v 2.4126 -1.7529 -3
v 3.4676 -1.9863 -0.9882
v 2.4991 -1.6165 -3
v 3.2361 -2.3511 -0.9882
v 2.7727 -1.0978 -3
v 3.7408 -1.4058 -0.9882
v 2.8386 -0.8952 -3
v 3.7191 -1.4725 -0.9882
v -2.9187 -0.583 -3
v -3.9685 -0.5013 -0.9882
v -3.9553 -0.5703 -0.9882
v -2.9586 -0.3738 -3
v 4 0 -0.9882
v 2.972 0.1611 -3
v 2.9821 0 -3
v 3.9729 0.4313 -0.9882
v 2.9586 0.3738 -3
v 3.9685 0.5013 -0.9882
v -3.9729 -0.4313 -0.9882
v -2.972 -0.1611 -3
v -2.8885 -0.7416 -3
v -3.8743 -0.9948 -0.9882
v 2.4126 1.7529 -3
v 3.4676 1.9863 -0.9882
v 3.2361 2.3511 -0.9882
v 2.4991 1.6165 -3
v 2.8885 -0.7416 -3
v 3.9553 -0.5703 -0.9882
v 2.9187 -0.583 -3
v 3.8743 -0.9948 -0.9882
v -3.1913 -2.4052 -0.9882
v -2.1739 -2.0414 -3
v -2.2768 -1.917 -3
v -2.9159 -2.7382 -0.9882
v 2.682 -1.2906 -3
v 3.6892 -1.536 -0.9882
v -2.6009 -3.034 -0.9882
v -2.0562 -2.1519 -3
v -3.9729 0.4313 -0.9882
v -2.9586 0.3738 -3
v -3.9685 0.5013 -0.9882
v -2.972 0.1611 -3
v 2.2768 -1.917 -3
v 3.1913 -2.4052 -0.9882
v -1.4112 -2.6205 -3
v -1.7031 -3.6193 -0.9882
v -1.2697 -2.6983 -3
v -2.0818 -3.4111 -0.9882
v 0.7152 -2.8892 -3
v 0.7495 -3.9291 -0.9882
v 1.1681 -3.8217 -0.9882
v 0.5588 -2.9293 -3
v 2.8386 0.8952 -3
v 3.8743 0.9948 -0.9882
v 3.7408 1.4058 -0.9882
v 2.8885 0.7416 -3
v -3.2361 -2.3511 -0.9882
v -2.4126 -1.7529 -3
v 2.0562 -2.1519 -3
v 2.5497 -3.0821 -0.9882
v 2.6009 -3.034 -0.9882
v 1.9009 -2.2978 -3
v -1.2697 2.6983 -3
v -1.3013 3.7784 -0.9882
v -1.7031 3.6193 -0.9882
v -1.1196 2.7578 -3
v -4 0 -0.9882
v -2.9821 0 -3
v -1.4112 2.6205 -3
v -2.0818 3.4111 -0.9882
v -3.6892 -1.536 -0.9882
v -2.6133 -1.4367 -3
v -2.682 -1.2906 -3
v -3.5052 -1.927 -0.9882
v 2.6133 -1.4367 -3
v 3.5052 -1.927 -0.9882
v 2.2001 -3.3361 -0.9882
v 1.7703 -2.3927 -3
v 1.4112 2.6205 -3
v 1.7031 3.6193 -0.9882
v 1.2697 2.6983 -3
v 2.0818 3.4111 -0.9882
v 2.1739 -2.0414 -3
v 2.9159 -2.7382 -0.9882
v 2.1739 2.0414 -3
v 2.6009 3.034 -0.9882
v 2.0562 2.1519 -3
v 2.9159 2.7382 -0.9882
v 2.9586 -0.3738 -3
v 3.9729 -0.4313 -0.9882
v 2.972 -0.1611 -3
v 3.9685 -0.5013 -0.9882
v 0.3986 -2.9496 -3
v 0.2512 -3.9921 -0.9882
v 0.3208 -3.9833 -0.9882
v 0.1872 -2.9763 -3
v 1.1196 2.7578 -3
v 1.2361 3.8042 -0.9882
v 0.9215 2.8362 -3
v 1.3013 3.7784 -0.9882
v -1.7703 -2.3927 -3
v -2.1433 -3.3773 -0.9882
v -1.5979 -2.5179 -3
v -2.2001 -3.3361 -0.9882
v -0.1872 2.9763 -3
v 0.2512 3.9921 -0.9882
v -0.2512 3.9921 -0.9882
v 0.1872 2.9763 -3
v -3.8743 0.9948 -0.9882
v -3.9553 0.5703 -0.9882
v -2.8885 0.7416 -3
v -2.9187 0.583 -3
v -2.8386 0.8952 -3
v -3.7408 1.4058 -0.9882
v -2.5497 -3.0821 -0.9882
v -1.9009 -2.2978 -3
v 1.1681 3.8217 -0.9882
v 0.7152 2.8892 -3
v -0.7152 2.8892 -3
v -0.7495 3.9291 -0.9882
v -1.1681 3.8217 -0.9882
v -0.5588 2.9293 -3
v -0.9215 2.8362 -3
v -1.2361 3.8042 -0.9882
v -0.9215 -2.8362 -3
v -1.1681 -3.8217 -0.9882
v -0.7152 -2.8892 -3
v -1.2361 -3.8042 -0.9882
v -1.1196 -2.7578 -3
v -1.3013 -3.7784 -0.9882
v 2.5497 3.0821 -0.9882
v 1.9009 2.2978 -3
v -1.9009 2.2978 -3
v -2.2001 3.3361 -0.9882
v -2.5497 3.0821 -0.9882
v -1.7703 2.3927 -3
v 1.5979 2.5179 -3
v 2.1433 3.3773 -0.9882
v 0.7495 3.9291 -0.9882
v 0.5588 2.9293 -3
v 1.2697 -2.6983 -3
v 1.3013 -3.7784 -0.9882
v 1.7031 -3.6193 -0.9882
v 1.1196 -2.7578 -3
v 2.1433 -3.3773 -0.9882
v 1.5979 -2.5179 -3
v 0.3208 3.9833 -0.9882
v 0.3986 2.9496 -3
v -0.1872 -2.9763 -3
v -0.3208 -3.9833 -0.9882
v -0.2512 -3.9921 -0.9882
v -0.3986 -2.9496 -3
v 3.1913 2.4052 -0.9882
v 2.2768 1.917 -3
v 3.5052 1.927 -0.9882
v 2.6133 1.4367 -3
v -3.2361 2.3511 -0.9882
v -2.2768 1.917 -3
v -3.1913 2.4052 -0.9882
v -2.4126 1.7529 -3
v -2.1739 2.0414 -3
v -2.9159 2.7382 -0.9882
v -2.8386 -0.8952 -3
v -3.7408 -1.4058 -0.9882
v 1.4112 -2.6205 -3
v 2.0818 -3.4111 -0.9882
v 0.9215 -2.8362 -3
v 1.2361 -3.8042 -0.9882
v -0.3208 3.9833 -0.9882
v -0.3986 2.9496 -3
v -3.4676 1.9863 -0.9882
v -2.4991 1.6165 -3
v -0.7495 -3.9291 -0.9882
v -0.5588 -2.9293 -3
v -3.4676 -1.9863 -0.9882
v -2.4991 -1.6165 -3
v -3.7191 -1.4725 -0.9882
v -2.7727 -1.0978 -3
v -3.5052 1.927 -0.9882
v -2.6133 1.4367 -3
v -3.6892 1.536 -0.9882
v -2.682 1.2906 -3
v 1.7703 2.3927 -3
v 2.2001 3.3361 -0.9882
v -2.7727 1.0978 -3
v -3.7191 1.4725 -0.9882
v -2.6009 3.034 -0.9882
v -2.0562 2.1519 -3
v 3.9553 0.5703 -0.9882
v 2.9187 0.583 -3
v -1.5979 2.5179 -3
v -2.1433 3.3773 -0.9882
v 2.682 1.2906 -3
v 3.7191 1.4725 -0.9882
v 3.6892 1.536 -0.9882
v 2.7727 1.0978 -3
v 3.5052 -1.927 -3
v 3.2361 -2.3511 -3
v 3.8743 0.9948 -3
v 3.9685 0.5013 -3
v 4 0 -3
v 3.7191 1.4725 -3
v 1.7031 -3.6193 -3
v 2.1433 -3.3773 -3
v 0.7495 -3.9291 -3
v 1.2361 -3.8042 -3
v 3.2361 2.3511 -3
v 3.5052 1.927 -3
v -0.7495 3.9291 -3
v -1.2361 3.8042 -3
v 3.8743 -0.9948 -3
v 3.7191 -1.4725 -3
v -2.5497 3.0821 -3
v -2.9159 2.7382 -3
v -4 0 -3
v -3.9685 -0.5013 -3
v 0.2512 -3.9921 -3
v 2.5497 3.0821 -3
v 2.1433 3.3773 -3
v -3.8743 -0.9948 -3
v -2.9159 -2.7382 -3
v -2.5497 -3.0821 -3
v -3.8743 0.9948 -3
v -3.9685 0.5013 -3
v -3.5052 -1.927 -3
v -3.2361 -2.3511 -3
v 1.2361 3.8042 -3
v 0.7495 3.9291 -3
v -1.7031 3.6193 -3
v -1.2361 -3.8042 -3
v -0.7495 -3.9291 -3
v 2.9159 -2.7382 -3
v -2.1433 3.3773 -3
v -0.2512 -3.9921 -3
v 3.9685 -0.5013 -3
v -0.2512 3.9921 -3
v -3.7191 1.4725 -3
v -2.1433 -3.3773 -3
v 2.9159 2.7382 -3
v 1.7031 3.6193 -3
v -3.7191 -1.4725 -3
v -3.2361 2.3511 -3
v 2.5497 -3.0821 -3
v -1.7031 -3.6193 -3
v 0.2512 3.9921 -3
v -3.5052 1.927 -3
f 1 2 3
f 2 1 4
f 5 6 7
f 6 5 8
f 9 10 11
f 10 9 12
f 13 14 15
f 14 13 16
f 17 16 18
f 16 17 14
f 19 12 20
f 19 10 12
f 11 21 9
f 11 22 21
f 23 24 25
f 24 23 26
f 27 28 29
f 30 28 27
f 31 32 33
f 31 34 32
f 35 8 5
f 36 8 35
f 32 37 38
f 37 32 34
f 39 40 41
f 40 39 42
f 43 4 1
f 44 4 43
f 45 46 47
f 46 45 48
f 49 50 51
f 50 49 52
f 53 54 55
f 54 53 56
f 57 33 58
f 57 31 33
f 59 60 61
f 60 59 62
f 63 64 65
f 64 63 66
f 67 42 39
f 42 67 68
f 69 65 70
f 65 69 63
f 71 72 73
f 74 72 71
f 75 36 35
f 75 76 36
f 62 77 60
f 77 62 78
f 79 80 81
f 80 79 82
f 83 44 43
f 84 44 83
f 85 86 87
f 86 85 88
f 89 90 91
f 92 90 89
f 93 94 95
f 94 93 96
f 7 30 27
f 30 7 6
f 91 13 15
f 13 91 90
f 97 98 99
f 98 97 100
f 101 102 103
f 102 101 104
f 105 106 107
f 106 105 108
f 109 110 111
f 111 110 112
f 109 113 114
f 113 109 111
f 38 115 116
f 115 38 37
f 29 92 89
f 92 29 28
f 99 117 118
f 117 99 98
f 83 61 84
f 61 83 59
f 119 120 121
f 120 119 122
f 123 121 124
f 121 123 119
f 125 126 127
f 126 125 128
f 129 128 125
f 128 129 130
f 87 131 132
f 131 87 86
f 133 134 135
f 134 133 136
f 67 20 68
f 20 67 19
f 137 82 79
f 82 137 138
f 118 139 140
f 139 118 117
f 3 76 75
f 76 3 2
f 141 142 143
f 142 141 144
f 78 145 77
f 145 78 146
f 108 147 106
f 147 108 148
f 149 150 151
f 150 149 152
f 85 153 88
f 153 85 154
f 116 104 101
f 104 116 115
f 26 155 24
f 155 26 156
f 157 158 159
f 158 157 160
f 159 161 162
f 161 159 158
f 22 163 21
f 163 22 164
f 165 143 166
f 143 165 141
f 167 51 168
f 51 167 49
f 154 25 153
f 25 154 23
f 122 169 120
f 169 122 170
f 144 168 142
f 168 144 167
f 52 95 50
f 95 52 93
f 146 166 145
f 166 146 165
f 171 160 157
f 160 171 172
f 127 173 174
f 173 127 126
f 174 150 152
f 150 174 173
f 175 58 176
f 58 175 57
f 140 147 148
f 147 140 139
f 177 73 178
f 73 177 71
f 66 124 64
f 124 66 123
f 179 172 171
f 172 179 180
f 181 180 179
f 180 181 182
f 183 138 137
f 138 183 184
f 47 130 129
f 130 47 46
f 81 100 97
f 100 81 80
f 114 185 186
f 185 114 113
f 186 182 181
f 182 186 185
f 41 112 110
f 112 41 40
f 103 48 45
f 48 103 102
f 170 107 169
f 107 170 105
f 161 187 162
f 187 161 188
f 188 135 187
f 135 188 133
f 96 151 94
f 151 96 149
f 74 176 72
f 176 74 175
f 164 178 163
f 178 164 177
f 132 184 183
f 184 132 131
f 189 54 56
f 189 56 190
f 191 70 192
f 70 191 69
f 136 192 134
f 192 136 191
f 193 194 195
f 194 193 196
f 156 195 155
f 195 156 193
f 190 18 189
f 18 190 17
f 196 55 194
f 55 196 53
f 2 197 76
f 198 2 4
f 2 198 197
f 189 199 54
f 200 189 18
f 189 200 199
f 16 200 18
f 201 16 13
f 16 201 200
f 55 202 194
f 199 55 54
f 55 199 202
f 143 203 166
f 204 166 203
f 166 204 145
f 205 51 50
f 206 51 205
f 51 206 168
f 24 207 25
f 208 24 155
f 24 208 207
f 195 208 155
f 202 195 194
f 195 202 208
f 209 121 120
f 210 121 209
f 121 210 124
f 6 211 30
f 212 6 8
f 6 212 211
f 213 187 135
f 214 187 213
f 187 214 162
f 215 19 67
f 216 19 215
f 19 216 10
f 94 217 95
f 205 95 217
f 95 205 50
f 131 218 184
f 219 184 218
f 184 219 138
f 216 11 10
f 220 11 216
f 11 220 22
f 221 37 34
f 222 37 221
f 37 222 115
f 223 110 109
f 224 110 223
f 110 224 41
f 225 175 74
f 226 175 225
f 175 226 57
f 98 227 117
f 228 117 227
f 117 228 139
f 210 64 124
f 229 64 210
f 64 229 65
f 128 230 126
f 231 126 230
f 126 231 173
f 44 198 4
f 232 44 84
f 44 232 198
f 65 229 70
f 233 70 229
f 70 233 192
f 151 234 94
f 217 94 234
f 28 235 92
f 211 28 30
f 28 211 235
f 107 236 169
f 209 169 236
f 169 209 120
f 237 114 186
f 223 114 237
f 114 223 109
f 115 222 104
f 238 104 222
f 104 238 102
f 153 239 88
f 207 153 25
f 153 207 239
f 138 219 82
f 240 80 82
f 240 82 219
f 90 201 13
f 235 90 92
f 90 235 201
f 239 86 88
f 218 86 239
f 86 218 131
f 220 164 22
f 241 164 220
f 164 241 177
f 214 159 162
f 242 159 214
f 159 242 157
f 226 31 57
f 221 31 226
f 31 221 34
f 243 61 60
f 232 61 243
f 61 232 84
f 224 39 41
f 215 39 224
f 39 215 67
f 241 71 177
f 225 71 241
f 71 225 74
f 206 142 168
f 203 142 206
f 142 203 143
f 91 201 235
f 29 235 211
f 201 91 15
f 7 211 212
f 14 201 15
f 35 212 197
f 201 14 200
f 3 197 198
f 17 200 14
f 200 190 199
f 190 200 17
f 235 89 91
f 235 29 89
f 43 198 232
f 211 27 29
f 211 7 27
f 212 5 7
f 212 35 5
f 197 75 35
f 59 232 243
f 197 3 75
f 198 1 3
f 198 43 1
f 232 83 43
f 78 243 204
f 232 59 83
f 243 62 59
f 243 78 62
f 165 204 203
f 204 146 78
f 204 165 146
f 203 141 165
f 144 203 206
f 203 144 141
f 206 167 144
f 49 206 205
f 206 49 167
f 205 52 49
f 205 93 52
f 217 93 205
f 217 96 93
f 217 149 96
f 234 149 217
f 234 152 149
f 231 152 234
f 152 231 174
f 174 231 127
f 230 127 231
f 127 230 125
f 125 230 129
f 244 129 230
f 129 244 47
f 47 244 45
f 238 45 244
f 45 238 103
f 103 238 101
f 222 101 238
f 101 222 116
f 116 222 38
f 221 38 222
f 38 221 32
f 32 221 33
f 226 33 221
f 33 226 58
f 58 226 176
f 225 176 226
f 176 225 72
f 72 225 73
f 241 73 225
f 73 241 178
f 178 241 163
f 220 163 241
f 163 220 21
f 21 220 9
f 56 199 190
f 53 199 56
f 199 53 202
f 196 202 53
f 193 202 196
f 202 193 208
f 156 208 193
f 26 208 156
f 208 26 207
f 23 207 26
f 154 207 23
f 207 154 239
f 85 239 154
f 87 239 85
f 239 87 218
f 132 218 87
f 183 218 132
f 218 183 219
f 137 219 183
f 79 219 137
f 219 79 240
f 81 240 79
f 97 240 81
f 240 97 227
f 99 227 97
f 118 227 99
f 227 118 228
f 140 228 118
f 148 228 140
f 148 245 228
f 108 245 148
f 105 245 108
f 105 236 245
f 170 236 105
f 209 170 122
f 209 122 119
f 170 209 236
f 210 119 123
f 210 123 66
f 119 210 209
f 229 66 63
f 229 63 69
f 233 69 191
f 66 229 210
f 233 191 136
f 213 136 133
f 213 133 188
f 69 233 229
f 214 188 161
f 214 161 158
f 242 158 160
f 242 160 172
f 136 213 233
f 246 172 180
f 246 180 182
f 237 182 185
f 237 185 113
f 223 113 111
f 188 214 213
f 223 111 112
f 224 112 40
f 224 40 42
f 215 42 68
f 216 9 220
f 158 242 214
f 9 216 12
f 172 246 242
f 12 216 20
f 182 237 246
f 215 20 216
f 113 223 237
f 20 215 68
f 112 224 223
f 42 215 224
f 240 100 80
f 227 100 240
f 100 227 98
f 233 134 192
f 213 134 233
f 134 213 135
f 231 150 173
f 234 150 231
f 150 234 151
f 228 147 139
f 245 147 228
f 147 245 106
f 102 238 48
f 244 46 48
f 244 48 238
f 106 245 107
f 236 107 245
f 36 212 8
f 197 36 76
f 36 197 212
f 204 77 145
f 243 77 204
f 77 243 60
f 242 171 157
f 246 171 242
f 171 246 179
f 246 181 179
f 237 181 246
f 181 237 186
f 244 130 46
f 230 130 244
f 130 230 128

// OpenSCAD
$fn = 50;

difference() {
	union() {
		translate(v = [0, 0, -3.0]) {
			cylinder(h = 3, r = 4.0);
		}
	}
	union() {
		translate(v = [0, 0, 0]) {
			rotate(a = [0, 0, 0]) {
				difference() {
					union() {
						translate(v = [0, 0, -6.0]) {
							cylinder(h = 6, r = 2.25);
						}
						translate(v = [0, 0, -4.2]) {
							cylinder(h = 4.2, r1 = 2.375, r2 = 4.5);
						}
						translate(v = [0, 0, -6.0]) {
							cylinder(h = 6, r = 2.375);
						}
						translate(v = [0, 0, -6.0]) {
							cylinder(h = 6, r = 2.25);
						}
					}
					union();
				}
			}
		}
	}
}
